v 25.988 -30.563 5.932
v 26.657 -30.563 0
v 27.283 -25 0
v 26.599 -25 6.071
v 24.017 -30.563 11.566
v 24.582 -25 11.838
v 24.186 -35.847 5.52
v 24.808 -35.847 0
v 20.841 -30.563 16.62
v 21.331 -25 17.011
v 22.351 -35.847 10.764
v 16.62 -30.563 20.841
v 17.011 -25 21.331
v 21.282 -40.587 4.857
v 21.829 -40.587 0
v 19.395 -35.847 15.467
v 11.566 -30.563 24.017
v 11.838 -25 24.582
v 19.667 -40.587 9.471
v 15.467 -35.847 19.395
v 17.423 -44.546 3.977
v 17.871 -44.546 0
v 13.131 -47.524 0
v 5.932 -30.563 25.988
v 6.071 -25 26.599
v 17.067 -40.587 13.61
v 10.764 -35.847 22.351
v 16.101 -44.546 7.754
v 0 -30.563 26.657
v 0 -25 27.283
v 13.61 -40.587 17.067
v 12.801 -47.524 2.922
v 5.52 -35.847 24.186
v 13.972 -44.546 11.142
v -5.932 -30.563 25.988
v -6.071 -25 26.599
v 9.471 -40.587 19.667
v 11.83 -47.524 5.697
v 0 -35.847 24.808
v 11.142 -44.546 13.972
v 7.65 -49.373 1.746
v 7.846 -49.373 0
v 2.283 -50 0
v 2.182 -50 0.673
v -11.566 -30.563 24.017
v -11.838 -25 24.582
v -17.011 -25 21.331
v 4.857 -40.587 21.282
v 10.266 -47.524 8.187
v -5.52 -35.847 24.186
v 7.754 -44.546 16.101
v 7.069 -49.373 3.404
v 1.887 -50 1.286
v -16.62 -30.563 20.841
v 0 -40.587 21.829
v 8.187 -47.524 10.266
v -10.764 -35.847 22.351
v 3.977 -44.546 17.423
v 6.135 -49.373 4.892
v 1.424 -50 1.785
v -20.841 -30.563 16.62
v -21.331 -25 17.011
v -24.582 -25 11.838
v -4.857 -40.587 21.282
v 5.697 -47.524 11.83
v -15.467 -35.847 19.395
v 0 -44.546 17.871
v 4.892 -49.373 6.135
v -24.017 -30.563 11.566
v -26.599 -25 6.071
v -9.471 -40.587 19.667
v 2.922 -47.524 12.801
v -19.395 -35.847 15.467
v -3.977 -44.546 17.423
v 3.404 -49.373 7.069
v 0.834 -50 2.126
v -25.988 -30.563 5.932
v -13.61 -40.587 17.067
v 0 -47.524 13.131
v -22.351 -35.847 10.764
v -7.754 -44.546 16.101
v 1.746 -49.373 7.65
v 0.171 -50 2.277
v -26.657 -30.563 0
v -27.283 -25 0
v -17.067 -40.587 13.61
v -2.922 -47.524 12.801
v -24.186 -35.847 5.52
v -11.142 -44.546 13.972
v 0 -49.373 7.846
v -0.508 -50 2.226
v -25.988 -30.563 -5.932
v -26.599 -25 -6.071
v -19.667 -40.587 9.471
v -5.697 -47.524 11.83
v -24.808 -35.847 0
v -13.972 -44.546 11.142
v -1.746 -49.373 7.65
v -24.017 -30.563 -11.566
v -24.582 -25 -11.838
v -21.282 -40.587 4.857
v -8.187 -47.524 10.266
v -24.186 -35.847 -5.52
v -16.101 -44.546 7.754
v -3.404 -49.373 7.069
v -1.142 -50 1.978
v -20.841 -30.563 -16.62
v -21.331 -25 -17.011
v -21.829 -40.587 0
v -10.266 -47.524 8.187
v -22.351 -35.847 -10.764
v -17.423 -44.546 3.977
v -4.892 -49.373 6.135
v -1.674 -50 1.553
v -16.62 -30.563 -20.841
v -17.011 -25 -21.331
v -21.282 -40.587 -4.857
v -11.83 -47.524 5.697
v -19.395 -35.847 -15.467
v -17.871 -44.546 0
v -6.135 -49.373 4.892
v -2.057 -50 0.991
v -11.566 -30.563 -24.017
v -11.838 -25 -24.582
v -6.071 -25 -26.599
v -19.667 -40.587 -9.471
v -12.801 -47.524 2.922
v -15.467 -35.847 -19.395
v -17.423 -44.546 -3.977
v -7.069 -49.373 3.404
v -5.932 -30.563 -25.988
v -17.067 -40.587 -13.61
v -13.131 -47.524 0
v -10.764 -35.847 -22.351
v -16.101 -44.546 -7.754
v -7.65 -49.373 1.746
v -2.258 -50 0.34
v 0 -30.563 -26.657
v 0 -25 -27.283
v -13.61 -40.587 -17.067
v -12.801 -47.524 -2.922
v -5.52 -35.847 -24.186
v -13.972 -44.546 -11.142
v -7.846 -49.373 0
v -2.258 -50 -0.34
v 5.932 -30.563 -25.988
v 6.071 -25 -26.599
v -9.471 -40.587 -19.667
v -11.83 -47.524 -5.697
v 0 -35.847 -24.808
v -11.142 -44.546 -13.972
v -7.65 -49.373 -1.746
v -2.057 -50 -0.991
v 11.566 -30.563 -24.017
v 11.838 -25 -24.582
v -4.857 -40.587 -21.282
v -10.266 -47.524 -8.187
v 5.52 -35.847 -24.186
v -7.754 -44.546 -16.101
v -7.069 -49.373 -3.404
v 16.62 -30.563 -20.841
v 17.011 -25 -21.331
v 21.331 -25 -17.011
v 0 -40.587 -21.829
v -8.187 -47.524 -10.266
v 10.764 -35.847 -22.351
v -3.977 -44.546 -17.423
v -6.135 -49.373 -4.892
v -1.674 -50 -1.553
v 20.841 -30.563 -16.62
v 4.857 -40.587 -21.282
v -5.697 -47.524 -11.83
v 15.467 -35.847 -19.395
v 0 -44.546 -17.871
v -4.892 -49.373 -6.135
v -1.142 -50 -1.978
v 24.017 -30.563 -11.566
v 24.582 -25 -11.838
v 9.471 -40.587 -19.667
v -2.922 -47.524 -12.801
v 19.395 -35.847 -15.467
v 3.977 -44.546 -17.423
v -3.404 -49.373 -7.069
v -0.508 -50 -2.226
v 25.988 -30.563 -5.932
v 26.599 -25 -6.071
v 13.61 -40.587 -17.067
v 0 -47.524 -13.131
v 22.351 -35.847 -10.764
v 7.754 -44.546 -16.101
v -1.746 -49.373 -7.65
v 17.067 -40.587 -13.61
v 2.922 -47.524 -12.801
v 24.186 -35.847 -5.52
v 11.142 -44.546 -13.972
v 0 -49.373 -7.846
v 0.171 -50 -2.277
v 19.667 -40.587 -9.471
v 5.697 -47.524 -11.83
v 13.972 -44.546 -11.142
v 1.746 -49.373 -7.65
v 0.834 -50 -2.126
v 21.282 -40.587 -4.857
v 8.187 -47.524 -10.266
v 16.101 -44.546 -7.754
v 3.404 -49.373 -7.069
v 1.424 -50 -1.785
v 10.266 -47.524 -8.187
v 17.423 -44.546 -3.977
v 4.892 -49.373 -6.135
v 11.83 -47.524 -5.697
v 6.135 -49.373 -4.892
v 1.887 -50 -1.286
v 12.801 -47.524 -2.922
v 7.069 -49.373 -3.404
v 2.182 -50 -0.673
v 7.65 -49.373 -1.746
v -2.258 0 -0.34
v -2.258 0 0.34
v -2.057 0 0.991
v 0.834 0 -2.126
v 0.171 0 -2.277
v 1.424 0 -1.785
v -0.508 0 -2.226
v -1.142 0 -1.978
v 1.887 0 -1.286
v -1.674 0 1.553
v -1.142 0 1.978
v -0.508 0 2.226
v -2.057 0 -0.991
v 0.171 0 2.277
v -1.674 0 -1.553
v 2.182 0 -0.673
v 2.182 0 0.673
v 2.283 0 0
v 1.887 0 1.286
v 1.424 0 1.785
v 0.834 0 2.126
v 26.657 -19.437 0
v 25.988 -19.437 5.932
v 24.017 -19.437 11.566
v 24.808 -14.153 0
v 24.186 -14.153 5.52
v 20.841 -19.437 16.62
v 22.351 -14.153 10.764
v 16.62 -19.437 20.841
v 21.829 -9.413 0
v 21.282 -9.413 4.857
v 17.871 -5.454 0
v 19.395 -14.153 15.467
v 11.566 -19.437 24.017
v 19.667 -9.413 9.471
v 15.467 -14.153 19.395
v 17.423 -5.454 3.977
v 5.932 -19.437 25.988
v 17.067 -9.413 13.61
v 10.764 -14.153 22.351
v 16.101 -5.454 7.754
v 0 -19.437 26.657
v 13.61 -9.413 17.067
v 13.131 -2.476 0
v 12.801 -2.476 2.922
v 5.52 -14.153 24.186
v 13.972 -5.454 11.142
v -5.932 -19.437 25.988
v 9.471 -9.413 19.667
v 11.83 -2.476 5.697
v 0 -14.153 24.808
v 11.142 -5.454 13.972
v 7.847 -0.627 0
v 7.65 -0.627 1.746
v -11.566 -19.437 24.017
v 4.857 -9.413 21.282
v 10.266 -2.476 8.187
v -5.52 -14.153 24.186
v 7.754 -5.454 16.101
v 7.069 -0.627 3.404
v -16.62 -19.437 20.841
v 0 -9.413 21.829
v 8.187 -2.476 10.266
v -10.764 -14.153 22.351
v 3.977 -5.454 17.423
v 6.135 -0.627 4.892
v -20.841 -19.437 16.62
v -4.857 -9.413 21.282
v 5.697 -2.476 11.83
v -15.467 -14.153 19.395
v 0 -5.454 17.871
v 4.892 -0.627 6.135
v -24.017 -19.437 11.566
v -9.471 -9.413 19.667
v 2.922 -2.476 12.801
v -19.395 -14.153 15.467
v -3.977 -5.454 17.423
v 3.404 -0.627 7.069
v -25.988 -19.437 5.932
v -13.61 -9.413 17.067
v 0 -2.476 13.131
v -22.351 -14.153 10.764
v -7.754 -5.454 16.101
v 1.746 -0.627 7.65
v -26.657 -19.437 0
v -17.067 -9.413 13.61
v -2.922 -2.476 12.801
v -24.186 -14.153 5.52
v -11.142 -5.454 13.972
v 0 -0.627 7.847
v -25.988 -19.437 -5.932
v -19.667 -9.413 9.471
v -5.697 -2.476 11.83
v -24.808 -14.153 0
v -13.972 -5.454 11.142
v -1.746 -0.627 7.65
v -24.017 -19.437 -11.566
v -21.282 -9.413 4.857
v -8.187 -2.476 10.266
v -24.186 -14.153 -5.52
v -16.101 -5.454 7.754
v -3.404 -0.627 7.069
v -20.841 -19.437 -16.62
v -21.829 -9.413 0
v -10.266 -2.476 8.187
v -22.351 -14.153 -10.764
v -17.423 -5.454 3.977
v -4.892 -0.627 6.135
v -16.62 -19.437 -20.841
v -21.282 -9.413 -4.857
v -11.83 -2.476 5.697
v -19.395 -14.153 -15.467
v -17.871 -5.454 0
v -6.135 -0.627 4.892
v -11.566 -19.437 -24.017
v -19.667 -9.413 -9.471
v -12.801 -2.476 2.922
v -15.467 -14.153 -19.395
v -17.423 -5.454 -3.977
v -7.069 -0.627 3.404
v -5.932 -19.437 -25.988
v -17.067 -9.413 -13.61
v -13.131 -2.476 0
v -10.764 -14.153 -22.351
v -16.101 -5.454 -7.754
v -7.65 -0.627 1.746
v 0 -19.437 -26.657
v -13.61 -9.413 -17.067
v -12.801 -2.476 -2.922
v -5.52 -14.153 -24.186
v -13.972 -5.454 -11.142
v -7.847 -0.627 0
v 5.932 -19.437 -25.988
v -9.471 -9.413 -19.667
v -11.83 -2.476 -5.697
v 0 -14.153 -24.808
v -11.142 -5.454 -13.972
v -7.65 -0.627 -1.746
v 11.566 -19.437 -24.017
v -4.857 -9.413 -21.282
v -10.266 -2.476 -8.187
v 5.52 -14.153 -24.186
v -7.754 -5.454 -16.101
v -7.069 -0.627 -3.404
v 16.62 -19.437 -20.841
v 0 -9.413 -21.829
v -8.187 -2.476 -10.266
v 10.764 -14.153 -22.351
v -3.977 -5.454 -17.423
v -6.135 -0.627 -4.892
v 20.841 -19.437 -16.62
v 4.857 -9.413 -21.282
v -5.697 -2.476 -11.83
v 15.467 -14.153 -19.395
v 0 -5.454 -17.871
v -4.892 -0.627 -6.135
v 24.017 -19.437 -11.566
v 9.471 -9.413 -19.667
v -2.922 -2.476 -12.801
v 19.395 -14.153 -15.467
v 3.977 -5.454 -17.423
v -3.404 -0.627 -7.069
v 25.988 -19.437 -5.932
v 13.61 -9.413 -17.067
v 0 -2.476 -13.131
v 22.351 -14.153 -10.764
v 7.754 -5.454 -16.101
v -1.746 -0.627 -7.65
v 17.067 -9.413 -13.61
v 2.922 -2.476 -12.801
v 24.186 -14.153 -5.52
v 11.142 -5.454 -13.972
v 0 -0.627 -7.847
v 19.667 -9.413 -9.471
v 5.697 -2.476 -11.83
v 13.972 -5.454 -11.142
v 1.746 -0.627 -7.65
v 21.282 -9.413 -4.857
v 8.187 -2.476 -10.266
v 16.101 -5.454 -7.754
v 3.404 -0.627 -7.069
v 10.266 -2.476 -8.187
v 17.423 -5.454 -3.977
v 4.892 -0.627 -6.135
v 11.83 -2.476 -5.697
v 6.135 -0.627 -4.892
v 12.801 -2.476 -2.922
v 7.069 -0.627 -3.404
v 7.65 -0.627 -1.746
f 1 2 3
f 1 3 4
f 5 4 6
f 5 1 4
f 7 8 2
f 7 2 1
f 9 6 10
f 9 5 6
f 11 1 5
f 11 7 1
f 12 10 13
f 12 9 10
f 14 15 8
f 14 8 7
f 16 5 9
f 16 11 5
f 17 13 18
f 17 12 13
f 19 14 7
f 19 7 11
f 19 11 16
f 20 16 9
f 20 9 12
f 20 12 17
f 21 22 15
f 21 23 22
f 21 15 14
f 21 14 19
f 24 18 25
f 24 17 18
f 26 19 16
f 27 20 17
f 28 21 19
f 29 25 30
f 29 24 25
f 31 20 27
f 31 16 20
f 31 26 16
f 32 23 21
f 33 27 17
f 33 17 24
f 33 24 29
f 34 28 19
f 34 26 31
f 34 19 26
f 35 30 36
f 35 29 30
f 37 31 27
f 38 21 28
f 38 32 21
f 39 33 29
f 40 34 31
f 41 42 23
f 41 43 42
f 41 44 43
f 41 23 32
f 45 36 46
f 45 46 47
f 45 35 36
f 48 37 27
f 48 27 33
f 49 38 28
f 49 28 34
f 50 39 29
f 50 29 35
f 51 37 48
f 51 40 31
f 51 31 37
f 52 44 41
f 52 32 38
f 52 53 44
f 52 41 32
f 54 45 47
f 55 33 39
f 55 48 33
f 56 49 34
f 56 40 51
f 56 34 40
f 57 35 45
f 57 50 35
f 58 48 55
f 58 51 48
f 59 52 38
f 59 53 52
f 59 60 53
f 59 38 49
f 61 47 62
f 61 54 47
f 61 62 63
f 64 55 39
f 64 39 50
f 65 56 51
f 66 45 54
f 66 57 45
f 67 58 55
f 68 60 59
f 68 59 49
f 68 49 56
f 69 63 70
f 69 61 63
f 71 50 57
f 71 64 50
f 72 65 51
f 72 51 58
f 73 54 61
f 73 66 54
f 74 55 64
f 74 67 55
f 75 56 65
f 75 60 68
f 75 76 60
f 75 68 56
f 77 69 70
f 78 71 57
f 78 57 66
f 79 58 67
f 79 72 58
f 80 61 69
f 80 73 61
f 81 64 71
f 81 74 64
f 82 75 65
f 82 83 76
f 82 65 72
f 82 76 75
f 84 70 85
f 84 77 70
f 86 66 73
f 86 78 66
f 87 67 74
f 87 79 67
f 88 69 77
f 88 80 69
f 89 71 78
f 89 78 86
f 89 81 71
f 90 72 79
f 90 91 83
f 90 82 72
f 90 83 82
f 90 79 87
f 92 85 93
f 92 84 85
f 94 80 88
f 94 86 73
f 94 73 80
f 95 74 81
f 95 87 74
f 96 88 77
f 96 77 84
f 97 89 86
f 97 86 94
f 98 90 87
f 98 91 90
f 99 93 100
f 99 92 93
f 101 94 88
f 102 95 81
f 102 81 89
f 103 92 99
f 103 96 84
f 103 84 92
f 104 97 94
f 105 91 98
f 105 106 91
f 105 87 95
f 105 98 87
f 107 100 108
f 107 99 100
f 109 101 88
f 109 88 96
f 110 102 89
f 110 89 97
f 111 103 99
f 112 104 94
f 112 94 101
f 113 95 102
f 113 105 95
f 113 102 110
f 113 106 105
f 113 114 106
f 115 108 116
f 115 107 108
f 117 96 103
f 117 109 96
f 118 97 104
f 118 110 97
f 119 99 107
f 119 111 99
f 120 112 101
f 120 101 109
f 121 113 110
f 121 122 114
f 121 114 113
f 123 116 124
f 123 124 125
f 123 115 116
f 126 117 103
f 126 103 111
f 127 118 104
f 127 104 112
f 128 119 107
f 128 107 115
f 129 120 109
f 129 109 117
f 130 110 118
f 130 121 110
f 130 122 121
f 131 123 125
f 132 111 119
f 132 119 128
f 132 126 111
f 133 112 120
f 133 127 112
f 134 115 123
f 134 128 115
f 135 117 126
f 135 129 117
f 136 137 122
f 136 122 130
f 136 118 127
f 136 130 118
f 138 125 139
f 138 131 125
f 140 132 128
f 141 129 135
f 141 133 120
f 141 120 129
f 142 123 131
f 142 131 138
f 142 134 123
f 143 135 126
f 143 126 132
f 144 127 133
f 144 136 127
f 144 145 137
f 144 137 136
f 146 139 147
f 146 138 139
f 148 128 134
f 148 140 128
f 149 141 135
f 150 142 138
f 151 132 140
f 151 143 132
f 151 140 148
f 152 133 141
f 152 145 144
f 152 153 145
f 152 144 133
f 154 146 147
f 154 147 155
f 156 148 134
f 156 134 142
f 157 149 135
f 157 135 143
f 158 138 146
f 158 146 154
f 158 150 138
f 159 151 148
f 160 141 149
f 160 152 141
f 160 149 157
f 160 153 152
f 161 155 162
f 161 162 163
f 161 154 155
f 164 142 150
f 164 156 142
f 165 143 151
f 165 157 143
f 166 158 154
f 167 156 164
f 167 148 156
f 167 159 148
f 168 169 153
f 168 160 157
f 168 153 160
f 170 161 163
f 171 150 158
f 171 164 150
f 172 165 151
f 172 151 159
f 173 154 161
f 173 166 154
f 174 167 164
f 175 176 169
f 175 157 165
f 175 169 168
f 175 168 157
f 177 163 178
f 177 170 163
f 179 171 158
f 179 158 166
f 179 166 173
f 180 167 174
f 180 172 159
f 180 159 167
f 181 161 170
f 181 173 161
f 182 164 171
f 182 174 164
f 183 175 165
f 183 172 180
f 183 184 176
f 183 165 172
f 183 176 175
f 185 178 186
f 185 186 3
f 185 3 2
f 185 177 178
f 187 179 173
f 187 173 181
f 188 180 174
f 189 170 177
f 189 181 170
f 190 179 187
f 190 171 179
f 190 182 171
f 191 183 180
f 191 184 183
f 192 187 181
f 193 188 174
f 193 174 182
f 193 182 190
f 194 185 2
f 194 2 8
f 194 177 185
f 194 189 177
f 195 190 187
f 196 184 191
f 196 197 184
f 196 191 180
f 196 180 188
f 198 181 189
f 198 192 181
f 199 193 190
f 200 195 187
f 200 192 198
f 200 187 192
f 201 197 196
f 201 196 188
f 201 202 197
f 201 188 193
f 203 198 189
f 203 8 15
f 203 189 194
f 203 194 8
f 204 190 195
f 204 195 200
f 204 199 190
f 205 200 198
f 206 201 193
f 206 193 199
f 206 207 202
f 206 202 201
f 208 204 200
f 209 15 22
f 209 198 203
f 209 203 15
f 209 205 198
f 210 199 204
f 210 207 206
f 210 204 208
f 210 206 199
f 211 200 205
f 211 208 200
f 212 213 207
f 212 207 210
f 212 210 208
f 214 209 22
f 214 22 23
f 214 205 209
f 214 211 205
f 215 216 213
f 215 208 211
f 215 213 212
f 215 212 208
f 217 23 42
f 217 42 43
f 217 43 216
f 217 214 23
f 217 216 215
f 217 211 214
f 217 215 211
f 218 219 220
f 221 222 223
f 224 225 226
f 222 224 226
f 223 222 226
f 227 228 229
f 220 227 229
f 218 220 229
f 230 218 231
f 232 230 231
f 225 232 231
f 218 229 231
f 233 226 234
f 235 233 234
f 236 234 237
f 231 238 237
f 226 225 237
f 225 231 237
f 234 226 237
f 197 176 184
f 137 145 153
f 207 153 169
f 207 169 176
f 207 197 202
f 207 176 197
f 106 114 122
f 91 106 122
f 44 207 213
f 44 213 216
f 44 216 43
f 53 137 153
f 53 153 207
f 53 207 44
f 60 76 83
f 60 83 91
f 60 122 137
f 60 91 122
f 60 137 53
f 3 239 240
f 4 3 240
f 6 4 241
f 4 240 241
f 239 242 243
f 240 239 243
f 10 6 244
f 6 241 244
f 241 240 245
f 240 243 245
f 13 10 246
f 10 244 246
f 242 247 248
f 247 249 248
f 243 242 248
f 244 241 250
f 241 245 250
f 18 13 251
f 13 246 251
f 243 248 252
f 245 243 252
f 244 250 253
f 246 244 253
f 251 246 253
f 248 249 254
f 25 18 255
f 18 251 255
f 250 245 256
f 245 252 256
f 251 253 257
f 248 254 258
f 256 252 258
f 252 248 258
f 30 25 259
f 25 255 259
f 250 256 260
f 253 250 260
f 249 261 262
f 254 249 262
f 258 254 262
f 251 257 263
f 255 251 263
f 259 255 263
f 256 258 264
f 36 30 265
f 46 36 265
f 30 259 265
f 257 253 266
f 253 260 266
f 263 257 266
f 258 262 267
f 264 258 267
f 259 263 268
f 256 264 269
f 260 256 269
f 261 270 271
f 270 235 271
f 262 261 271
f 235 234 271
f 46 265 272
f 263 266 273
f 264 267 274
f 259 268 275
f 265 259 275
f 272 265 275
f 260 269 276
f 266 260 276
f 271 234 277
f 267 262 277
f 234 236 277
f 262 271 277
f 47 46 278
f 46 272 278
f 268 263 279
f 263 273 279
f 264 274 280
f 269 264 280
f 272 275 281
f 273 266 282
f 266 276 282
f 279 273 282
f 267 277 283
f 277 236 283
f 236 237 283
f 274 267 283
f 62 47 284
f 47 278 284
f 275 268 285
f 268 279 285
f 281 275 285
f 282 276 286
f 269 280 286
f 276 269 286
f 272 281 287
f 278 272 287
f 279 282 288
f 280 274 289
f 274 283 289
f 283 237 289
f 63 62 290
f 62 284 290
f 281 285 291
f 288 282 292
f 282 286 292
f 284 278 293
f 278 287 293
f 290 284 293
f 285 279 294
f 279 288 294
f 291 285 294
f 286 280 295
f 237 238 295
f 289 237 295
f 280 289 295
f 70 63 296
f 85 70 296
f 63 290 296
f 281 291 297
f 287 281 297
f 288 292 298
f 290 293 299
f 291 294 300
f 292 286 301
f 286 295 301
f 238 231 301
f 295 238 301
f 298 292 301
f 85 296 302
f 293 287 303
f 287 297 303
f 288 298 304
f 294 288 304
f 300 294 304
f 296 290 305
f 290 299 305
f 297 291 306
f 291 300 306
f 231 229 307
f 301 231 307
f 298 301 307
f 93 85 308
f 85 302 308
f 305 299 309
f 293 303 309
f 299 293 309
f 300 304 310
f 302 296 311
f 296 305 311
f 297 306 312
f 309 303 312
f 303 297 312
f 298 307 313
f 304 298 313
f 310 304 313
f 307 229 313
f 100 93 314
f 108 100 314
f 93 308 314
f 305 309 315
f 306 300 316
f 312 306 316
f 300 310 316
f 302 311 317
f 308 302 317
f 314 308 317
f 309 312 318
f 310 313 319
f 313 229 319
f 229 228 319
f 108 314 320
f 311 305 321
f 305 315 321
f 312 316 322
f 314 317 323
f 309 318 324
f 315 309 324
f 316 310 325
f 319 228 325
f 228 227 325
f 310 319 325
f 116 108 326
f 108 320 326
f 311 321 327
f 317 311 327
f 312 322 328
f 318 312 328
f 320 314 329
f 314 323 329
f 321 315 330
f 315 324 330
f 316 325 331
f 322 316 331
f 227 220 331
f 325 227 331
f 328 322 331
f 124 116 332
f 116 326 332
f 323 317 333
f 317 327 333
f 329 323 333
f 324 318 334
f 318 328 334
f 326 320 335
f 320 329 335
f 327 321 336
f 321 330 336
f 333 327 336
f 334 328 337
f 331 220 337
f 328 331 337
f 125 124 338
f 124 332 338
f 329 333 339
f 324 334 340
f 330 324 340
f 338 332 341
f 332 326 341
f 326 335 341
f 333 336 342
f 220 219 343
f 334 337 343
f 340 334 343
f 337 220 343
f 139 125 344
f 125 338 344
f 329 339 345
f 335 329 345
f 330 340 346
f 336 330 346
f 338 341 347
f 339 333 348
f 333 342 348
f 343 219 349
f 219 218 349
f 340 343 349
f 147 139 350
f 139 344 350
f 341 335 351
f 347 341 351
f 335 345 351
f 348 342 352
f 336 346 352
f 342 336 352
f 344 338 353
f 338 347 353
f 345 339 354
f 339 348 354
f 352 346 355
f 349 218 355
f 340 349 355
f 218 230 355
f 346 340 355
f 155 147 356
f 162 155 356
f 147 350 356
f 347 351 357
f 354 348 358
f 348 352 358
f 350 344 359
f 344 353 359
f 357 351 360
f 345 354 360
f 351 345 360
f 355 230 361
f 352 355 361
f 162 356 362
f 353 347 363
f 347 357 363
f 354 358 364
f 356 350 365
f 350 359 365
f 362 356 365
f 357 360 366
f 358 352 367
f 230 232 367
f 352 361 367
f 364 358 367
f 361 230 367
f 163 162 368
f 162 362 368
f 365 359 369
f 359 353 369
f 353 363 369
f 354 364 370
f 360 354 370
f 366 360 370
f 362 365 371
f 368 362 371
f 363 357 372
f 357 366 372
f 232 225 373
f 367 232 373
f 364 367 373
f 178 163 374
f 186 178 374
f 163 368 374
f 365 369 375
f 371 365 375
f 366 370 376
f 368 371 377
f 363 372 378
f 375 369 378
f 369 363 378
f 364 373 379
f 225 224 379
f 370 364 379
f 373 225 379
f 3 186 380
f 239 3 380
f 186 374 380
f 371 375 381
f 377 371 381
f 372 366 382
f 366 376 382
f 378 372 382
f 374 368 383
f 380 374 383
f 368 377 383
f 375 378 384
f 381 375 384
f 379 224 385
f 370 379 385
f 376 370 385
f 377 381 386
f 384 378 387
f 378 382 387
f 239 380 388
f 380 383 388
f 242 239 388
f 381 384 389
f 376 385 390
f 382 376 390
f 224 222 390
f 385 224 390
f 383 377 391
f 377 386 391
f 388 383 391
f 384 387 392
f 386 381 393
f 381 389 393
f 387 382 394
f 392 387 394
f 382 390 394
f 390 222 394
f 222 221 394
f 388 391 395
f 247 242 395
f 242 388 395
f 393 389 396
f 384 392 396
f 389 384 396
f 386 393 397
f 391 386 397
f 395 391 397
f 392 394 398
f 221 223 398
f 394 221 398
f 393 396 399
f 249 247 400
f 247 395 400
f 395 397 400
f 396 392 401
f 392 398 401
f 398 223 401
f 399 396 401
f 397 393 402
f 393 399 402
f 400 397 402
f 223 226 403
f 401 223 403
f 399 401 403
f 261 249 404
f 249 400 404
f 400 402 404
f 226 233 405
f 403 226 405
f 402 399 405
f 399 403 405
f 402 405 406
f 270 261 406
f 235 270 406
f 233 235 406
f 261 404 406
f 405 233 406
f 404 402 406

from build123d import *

# Parameters (mm, degrees)
F0_R     = 27.2834758809
F1_DEPTH = 25
F2_R     = 24.99999
F3_DEPTH = 25
F4_R     = 25


# Not quite as in the source:
# - a fillet or chamfer is up to 0.001 mm smaller than in the source, because OpenCascade refuses the exact size


with BuildPart() as f1:
    # F0 (on Front) → F1 (new body)
    with BuildSketch(Plane.XZ):
        Circle(F0_R)
    extrude(amount=F1_DEPTH)

    # F2 (radius 25 in the source; OpenCascade refuses exactly that, so slightly less here)
    f2_edges = [f1.edges().sort_by_distance(p)[0] for p in [
        (-27.283476, 0, 0),
    ]]
    fillet(f2_edges, radius=F2_R)

    # F3 (add): a face of the model
    f3_faces = [f1.faces().sort_by_distance(p)[0] for p in [
        (0, -25, 0),
    ]]
    extrude(f3_faces, amount=F3_DEPTH)

    # F4
    f4_edges = [f1.edges().sort_by_distance(p)[0] for p in [
        (-27.283476, -50, 0),
    ]]
    fillet(f4_edges, radius=F4_R)


solid = f1.part
